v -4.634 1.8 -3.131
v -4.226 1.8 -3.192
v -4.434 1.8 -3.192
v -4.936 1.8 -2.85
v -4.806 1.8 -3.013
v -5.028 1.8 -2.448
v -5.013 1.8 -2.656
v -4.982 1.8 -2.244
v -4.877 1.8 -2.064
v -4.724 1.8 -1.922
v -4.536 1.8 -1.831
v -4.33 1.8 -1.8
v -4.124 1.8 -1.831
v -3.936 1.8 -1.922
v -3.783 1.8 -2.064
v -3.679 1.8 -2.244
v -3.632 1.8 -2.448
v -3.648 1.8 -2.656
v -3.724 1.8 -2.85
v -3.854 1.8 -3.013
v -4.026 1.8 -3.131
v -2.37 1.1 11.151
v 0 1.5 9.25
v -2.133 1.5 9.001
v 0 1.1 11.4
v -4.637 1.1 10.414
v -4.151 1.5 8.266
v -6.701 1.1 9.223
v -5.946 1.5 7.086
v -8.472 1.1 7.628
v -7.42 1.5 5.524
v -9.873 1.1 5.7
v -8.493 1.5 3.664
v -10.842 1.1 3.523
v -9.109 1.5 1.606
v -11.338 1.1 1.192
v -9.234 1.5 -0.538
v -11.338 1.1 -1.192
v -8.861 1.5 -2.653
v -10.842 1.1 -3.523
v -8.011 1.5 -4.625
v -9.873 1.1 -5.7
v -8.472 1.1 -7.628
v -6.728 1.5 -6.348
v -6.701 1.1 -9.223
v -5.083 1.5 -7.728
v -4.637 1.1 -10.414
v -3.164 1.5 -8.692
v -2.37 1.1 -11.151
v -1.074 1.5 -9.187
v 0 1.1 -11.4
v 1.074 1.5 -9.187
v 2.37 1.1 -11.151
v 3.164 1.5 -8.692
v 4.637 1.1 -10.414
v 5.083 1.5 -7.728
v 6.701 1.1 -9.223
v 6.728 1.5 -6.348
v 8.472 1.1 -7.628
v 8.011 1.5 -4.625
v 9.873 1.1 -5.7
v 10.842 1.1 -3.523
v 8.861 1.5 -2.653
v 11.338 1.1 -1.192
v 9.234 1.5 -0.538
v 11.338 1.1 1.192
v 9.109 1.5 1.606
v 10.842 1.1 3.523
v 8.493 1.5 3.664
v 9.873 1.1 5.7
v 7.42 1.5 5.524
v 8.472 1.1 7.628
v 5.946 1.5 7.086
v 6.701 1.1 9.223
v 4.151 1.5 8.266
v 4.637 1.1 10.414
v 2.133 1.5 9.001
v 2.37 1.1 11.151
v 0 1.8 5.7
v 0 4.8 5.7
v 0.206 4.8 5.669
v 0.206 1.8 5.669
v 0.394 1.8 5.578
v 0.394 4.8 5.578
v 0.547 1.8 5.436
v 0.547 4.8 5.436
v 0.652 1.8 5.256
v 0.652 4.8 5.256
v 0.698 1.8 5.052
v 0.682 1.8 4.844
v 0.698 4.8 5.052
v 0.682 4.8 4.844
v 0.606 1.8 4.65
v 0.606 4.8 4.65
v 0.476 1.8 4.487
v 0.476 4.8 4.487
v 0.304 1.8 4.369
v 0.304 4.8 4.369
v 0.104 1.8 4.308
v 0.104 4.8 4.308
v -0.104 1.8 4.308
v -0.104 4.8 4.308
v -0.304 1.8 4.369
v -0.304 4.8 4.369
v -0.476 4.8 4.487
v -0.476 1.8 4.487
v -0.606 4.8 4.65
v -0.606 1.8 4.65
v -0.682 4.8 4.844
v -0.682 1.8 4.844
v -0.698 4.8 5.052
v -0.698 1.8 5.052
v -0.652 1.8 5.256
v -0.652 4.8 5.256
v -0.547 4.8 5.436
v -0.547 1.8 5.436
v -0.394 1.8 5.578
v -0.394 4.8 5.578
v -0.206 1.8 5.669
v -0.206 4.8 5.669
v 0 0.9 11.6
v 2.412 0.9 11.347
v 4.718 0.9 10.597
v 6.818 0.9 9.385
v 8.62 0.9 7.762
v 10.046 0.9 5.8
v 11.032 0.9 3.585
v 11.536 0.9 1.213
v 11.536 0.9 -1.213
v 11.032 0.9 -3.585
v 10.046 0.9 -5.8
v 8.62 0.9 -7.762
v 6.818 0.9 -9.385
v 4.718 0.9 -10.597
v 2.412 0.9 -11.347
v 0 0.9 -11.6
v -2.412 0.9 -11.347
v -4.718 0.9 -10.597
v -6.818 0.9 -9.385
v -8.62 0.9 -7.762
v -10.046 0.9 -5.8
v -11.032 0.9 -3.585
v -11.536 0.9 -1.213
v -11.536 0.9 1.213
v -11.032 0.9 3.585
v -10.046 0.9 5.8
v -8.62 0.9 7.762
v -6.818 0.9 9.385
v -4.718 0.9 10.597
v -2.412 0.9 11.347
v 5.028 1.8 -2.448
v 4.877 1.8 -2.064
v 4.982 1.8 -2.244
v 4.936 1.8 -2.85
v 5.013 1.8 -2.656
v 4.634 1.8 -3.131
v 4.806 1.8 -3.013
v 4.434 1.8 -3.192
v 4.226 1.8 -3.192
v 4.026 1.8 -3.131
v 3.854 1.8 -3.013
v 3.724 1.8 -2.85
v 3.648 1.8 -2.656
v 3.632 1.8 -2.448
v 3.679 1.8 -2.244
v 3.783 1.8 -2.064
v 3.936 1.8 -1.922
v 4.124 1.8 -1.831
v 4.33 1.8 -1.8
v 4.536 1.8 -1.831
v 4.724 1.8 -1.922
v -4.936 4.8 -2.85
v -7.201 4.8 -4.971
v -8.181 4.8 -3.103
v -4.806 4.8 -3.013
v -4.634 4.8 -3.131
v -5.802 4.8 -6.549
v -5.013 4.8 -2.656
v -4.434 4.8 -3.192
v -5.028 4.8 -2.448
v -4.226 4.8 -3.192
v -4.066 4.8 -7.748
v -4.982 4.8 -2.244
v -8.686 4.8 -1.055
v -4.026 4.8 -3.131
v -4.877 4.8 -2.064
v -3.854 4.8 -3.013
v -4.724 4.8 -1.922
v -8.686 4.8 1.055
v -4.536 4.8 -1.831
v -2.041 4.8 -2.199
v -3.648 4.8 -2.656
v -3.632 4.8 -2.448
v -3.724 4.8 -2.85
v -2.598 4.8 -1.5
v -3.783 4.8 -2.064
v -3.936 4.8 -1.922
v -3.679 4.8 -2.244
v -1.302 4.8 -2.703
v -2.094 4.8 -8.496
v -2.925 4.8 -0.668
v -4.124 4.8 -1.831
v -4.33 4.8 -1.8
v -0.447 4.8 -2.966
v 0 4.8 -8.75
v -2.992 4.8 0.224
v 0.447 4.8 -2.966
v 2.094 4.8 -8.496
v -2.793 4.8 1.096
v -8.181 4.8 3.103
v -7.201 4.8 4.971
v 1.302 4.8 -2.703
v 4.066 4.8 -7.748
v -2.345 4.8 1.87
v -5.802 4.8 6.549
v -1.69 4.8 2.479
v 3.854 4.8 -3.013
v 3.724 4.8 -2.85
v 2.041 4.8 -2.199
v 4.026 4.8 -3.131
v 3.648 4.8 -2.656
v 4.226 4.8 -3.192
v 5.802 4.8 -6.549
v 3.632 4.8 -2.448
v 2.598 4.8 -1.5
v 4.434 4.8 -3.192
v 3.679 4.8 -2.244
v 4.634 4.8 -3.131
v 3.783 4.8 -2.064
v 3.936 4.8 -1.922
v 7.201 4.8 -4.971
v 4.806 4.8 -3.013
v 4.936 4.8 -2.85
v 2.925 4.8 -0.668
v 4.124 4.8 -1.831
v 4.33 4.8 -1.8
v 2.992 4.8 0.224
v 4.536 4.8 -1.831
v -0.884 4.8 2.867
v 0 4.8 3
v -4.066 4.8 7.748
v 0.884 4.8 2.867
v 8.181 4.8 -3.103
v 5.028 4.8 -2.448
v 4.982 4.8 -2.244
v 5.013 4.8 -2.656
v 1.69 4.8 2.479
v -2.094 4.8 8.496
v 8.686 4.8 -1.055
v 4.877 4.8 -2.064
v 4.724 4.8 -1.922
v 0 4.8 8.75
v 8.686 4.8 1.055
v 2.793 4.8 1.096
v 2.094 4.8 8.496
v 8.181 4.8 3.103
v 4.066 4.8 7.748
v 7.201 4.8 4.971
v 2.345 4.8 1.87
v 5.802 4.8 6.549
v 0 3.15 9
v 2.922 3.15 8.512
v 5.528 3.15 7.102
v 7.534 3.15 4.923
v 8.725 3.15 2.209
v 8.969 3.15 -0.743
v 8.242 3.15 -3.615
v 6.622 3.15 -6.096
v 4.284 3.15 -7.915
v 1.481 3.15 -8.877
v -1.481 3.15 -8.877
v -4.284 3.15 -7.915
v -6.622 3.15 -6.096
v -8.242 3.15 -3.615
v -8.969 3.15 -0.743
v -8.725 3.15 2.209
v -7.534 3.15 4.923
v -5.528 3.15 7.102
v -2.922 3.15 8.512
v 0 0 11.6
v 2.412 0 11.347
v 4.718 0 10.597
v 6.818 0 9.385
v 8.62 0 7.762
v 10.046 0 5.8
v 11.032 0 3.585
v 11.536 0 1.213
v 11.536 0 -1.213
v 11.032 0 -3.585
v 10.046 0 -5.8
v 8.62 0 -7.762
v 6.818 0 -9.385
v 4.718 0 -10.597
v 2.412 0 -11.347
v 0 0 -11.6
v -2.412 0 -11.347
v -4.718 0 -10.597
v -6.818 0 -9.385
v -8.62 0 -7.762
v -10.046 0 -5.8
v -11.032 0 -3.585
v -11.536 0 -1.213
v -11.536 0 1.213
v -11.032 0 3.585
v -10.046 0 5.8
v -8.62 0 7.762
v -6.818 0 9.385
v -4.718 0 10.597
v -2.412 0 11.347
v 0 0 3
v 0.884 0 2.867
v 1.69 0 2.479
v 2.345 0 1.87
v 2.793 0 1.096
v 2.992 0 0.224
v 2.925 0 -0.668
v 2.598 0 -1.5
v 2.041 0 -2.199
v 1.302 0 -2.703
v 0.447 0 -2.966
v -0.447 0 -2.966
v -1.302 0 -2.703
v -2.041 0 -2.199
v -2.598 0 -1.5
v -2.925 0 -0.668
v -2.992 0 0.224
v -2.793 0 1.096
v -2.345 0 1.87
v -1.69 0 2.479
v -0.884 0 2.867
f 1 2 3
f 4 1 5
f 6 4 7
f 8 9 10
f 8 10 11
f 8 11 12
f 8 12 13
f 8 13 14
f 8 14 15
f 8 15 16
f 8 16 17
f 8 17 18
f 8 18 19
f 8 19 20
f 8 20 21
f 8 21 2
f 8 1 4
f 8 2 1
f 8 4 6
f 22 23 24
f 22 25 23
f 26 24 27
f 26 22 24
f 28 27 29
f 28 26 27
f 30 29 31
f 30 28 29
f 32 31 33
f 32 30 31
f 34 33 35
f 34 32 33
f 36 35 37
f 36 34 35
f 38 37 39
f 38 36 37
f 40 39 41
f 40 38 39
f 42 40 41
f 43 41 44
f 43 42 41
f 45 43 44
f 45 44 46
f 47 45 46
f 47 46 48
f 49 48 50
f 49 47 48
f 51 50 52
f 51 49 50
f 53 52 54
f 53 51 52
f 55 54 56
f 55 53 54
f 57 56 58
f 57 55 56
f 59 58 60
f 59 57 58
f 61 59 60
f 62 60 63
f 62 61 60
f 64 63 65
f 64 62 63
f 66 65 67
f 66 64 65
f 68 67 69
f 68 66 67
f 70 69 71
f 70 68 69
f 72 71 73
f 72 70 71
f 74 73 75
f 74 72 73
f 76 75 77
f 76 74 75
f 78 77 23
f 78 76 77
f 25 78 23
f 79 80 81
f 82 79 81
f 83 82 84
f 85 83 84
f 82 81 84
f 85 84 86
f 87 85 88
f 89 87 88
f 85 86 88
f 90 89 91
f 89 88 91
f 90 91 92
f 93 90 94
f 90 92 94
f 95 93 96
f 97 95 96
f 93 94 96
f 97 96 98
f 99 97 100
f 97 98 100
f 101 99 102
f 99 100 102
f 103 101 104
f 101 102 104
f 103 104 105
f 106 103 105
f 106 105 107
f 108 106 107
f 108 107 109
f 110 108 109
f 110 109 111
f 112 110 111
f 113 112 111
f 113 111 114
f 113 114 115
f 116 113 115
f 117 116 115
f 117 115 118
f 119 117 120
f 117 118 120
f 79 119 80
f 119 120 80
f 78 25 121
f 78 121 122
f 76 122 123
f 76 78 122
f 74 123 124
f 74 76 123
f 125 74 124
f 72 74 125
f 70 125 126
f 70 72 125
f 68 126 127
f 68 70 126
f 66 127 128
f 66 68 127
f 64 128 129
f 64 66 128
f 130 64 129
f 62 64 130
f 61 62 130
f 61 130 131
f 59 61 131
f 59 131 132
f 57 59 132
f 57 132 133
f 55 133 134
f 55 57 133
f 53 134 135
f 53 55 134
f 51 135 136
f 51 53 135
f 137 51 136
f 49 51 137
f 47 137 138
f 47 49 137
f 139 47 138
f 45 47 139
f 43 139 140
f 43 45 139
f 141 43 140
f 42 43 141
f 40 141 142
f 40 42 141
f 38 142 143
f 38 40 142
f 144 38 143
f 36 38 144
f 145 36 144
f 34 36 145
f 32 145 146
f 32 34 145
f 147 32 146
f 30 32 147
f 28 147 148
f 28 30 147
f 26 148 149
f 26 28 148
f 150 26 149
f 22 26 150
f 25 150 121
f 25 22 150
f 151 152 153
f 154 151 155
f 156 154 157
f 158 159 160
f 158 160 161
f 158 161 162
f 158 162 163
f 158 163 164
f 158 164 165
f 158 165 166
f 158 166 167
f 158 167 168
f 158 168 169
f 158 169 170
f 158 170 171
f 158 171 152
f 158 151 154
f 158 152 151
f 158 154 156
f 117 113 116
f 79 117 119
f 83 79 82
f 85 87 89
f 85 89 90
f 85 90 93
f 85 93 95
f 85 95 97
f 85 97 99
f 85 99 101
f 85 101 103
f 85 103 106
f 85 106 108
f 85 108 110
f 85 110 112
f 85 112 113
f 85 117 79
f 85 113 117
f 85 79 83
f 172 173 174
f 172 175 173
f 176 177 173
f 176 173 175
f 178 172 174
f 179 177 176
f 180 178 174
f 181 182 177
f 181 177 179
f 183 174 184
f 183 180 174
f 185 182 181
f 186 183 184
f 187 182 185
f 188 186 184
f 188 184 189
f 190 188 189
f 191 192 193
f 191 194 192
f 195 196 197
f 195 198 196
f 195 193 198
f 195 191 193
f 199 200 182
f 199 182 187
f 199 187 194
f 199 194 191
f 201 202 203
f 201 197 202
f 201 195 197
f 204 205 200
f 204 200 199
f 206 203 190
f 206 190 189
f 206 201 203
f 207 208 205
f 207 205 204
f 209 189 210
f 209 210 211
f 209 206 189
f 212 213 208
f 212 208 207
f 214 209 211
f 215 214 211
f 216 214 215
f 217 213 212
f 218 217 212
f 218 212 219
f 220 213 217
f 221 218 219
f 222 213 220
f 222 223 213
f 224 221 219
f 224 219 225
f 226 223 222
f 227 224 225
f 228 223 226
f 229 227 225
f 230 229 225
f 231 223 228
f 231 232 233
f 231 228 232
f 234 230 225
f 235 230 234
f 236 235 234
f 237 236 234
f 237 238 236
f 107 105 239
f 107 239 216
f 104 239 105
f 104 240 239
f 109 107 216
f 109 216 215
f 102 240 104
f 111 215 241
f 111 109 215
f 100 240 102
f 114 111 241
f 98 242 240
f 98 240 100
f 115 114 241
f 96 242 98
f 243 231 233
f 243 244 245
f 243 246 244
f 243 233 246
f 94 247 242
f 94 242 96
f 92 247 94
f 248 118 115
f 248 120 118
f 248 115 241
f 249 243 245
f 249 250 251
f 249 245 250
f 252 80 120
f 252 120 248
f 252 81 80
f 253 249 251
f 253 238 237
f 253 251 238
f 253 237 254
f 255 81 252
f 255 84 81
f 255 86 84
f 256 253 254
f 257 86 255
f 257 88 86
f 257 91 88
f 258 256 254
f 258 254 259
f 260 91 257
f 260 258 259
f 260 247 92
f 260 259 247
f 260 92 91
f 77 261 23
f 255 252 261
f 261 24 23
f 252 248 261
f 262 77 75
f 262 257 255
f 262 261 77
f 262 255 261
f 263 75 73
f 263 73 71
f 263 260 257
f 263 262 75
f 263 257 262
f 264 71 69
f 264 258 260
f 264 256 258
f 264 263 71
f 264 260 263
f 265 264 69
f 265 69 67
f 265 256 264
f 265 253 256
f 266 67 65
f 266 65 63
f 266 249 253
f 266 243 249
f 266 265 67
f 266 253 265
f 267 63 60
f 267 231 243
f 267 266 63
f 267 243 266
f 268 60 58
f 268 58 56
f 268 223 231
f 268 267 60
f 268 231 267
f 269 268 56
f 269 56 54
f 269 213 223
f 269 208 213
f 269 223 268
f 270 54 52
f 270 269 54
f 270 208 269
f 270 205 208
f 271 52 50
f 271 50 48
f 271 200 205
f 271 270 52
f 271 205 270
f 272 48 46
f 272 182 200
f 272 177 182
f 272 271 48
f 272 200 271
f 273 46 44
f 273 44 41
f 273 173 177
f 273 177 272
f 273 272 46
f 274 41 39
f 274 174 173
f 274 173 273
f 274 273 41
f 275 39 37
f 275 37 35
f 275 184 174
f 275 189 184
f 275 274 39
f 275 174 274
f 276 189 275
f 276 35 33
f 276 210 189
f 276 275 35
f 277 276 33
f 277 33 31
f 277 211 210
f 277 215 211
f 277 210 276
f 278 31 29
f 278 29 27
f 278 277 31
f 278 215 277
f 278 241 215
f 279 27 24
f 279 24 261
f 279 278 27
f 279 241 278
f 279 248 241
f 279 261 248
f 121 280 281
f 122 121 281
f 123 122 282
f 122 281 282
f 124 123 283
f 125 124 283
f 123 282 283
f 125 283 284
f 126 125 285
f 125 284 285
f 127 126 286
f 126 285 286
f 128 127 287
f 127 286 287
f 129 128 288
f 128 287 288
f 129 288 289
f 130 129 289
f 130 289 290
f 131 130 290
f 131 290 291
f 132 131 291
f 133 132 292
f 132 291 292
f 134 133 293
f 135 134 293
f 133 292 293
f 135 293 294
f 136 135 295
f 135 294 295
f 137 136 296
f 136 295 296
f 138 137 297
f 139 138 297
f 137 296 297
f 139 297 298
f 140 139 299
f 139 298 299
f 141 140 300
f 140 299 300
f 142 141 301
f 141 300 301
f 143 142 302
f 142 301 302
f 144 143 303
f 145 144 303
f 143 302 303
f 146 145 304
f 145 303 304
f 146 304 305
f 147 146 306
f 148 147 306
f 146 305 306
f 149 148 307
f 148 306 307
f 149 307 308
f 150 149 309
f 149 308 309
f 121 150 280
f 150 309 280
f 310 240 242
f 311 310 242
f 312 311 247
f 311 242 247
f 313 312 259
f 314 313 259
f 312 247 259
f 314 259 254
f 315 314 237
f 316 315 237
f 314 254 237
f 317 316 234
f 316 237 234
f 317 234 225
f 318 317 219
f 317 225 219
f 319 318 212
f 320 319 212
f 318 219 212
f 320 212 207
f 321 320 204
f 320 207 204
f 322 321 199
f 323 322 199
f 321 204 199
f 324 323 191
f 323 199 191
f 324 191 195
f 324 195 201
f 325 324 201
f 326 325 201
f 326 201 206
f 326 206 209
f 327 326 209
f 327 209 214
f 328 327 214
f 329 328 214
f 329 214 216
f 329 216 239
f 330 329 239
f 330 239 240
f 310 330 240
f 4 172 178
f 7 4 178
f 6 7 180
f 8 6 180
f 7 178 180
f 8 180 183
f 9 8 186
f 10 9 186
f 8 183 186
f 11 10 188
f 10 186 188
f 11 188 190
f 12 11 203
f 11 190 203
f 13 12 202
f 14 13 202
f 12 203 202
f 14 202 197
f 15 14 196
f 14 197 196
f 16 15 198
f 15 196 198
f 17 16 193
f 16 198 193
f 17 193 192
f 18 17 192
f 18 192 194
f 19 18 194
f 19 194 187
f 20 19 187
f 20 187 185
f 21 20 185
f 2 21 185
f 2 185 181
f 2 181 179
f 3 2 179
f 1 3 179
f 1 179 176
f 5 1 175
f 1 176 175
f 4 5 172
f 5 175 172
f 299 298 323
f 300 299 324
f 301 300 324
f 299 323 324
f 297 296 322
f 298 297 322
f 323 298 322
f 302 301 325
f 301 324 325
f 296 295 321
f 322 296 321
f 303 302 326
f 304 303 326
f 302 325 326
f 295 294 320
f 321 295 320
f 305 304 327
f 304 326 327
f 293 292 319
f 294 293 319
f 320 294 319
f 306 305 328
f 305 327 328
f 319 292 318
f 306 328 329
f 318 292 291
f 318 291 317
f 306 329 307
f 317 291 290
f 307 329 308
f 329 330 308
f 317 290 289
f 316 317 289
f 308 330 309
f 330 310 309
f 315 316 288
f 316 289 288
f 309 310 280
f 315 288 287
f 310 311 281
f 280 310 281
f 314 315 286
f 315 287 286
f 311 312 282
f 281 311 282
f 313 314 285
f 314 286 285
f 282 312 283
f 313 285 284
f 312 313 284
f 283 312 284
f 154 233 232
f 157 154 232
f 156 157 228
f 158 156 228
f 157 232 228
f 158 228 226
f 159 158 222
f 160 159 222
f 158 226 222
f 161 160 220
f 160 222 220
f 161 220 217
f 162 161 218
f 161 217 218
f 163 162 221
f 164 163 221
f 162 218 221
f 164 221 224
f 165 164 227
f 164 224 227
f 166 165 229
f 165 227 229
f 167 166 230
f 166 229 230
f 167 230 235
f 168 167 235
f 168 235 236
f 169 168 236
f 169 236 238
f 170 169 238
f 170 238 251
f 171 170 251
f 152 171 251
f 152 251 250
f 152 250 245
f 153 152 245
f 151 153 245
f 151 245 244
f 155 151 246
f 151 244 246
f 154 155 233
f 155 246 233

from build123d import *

# Parameters (mm, degrees)
SKETCH_4_R               = 11.6
SKETCH_4_R_2             = 1.1
EXTRUDE_1_DEPTH          = 1.1
EXTRUDE_START            = 1.5
SKETCH_4_3_R             = 9.25
SKETCH_4_3_R_2           = 1.1
EXTRUDE_2_DEPTH          = 3.3
CHAMFER_1_SIZE           = 0.2
SKETCH_6_R               = 3
CUT_EXTRUDE_1_DEPTH      = 18.092688495
SKETCH_7_R               = 0.7
CUT_EXTRUDE_2_DEPTH      = 3
PATTERN_CIRCULAR_1_COUNT = 3
CHAMFER_2_SIZE           = 3.3
CHAMFER_2_SIZE_2         = 0.5


with BuildPart() as part:
    # 草图4 → 凸台-拉伸1 (new body)
    with BuildSketch(Plane(origin=(0, 0, 0), x_dir=(1, 0, 0), z_dir=(0, 1, 0))):
        with Locations(Location((0, 0, 0), (0, 0, 270))):
            Circle(SKETCH_4_R)
        with Locations(Location((0, 0, 0), (0, 0, 270))):
            Circle(SKETCH_4_R_2, mode=Mode.SUBTRACT)
    extrude(amount=EXTRUDE_1_DEPTH)

    # 倒角1
    chamfer_1_edges = [part.edges().sort_by_distance(p)[0] for p in [
        (0, 1.1, -11.6),
    ]]
    chamfer(chamfer_1_edges, length=CHAMFER_1_SIZE)


with BuildPart() as body_2:
    # 草图4<3> → 凸台-拉伸2 (new body)
    with BuildSketch(Plane(origin=(0, 0, 0), x_dir=(1, 0, 0), z_dir=(0, 1, 0)).offset(EXTRUDE_START)):
        with Locations(Location((0, 0, 0), (0, 0, 270))):
            Circle(SKETCH_4_3_R)
        with Locations(Location((0, 0, 0), (0, 0, 270))):
            Circle(SKETCH_4_3_R_2, mode=Mode.SUBTRACT)
    extrude(amount=EXTRUDE_2_DEPTH)


    add(part.part)  # loft_1 joins it to this body
    # loft up to a face of the part (loft_1)
    loft([Face(Wire([body_2.edges().sort_by_distance((-6.742959804, 1.5, -6.33206073))[0]])), Face(Wire([body_2.edges().sort_by_distance((8.310242353, 1.1, -7.803837008))[0]]))])

    # 草图6 → 切除-拉伸1 (cut, through all)
    with BuildSketch(Plane(origin=(0, 4.8, 0), x_dir=(1, 0, 0), z_dir=(0, 1, 0))):
        with Locations(Location((0, 0, 0), (0, 0, 270))):
            Circle(SKETCH_6_R)
    extrude(amount=-CUT_EXTRUDE_1_DEPTH, mode=Mode.SUBTRACT)

    # 草图7 → 切除-拉伸2 (cut)
    with BuildSketch(Plane(origin=(0, 4.8, 0), x_dir=(1, 0, 0), z_dir=(0, 1, 0))):
        with Locations(Location((0, -5, 0), (0, 0, 270))):
            Circle(SKETCH_7_R)
    cut_extrude_2 = extrude(amount=-CUT_EXTRUDE_2_DEPTH, mode=Mode.SUBTRACT)

    # 阵列(圆周)1: 切除-拉伸2 ×3 about axis
    pattern_circular_1_axis = Axis((0, 0, 0), (0, 1, 0))
    for i in range(1, PATTERN_CIRCULAR_1_COUNT):
        add(cut_extrude_2.rotate(pattern_circular_1_axis, i * 360 / PATTERN_CIRCULAR_1_COUNT), mode=Mode.SUBTRACT)

    # 倒角2
    # the kernel refuses this chamfer: 3.3, 0.5 mm, written as the material it takes off along each edge
    with BuildSketch(Plane(origin=(0, 4.8, 0), x_dir=(0, 0, 1), z_dir=(-1, 0, 0))) as chamfer_2_piece_1:
        Polygon((9.25, -CHAMFER_2_SIZE), (9.25 - CHAMFER_2_SIZE_2, 0), (9.25, 0), align=None)
    revolve(axis=Axis((0, 4.8, 0), (0, 1, 0)), mode=Mode.SUBTRACT)


solid = body_2.part
